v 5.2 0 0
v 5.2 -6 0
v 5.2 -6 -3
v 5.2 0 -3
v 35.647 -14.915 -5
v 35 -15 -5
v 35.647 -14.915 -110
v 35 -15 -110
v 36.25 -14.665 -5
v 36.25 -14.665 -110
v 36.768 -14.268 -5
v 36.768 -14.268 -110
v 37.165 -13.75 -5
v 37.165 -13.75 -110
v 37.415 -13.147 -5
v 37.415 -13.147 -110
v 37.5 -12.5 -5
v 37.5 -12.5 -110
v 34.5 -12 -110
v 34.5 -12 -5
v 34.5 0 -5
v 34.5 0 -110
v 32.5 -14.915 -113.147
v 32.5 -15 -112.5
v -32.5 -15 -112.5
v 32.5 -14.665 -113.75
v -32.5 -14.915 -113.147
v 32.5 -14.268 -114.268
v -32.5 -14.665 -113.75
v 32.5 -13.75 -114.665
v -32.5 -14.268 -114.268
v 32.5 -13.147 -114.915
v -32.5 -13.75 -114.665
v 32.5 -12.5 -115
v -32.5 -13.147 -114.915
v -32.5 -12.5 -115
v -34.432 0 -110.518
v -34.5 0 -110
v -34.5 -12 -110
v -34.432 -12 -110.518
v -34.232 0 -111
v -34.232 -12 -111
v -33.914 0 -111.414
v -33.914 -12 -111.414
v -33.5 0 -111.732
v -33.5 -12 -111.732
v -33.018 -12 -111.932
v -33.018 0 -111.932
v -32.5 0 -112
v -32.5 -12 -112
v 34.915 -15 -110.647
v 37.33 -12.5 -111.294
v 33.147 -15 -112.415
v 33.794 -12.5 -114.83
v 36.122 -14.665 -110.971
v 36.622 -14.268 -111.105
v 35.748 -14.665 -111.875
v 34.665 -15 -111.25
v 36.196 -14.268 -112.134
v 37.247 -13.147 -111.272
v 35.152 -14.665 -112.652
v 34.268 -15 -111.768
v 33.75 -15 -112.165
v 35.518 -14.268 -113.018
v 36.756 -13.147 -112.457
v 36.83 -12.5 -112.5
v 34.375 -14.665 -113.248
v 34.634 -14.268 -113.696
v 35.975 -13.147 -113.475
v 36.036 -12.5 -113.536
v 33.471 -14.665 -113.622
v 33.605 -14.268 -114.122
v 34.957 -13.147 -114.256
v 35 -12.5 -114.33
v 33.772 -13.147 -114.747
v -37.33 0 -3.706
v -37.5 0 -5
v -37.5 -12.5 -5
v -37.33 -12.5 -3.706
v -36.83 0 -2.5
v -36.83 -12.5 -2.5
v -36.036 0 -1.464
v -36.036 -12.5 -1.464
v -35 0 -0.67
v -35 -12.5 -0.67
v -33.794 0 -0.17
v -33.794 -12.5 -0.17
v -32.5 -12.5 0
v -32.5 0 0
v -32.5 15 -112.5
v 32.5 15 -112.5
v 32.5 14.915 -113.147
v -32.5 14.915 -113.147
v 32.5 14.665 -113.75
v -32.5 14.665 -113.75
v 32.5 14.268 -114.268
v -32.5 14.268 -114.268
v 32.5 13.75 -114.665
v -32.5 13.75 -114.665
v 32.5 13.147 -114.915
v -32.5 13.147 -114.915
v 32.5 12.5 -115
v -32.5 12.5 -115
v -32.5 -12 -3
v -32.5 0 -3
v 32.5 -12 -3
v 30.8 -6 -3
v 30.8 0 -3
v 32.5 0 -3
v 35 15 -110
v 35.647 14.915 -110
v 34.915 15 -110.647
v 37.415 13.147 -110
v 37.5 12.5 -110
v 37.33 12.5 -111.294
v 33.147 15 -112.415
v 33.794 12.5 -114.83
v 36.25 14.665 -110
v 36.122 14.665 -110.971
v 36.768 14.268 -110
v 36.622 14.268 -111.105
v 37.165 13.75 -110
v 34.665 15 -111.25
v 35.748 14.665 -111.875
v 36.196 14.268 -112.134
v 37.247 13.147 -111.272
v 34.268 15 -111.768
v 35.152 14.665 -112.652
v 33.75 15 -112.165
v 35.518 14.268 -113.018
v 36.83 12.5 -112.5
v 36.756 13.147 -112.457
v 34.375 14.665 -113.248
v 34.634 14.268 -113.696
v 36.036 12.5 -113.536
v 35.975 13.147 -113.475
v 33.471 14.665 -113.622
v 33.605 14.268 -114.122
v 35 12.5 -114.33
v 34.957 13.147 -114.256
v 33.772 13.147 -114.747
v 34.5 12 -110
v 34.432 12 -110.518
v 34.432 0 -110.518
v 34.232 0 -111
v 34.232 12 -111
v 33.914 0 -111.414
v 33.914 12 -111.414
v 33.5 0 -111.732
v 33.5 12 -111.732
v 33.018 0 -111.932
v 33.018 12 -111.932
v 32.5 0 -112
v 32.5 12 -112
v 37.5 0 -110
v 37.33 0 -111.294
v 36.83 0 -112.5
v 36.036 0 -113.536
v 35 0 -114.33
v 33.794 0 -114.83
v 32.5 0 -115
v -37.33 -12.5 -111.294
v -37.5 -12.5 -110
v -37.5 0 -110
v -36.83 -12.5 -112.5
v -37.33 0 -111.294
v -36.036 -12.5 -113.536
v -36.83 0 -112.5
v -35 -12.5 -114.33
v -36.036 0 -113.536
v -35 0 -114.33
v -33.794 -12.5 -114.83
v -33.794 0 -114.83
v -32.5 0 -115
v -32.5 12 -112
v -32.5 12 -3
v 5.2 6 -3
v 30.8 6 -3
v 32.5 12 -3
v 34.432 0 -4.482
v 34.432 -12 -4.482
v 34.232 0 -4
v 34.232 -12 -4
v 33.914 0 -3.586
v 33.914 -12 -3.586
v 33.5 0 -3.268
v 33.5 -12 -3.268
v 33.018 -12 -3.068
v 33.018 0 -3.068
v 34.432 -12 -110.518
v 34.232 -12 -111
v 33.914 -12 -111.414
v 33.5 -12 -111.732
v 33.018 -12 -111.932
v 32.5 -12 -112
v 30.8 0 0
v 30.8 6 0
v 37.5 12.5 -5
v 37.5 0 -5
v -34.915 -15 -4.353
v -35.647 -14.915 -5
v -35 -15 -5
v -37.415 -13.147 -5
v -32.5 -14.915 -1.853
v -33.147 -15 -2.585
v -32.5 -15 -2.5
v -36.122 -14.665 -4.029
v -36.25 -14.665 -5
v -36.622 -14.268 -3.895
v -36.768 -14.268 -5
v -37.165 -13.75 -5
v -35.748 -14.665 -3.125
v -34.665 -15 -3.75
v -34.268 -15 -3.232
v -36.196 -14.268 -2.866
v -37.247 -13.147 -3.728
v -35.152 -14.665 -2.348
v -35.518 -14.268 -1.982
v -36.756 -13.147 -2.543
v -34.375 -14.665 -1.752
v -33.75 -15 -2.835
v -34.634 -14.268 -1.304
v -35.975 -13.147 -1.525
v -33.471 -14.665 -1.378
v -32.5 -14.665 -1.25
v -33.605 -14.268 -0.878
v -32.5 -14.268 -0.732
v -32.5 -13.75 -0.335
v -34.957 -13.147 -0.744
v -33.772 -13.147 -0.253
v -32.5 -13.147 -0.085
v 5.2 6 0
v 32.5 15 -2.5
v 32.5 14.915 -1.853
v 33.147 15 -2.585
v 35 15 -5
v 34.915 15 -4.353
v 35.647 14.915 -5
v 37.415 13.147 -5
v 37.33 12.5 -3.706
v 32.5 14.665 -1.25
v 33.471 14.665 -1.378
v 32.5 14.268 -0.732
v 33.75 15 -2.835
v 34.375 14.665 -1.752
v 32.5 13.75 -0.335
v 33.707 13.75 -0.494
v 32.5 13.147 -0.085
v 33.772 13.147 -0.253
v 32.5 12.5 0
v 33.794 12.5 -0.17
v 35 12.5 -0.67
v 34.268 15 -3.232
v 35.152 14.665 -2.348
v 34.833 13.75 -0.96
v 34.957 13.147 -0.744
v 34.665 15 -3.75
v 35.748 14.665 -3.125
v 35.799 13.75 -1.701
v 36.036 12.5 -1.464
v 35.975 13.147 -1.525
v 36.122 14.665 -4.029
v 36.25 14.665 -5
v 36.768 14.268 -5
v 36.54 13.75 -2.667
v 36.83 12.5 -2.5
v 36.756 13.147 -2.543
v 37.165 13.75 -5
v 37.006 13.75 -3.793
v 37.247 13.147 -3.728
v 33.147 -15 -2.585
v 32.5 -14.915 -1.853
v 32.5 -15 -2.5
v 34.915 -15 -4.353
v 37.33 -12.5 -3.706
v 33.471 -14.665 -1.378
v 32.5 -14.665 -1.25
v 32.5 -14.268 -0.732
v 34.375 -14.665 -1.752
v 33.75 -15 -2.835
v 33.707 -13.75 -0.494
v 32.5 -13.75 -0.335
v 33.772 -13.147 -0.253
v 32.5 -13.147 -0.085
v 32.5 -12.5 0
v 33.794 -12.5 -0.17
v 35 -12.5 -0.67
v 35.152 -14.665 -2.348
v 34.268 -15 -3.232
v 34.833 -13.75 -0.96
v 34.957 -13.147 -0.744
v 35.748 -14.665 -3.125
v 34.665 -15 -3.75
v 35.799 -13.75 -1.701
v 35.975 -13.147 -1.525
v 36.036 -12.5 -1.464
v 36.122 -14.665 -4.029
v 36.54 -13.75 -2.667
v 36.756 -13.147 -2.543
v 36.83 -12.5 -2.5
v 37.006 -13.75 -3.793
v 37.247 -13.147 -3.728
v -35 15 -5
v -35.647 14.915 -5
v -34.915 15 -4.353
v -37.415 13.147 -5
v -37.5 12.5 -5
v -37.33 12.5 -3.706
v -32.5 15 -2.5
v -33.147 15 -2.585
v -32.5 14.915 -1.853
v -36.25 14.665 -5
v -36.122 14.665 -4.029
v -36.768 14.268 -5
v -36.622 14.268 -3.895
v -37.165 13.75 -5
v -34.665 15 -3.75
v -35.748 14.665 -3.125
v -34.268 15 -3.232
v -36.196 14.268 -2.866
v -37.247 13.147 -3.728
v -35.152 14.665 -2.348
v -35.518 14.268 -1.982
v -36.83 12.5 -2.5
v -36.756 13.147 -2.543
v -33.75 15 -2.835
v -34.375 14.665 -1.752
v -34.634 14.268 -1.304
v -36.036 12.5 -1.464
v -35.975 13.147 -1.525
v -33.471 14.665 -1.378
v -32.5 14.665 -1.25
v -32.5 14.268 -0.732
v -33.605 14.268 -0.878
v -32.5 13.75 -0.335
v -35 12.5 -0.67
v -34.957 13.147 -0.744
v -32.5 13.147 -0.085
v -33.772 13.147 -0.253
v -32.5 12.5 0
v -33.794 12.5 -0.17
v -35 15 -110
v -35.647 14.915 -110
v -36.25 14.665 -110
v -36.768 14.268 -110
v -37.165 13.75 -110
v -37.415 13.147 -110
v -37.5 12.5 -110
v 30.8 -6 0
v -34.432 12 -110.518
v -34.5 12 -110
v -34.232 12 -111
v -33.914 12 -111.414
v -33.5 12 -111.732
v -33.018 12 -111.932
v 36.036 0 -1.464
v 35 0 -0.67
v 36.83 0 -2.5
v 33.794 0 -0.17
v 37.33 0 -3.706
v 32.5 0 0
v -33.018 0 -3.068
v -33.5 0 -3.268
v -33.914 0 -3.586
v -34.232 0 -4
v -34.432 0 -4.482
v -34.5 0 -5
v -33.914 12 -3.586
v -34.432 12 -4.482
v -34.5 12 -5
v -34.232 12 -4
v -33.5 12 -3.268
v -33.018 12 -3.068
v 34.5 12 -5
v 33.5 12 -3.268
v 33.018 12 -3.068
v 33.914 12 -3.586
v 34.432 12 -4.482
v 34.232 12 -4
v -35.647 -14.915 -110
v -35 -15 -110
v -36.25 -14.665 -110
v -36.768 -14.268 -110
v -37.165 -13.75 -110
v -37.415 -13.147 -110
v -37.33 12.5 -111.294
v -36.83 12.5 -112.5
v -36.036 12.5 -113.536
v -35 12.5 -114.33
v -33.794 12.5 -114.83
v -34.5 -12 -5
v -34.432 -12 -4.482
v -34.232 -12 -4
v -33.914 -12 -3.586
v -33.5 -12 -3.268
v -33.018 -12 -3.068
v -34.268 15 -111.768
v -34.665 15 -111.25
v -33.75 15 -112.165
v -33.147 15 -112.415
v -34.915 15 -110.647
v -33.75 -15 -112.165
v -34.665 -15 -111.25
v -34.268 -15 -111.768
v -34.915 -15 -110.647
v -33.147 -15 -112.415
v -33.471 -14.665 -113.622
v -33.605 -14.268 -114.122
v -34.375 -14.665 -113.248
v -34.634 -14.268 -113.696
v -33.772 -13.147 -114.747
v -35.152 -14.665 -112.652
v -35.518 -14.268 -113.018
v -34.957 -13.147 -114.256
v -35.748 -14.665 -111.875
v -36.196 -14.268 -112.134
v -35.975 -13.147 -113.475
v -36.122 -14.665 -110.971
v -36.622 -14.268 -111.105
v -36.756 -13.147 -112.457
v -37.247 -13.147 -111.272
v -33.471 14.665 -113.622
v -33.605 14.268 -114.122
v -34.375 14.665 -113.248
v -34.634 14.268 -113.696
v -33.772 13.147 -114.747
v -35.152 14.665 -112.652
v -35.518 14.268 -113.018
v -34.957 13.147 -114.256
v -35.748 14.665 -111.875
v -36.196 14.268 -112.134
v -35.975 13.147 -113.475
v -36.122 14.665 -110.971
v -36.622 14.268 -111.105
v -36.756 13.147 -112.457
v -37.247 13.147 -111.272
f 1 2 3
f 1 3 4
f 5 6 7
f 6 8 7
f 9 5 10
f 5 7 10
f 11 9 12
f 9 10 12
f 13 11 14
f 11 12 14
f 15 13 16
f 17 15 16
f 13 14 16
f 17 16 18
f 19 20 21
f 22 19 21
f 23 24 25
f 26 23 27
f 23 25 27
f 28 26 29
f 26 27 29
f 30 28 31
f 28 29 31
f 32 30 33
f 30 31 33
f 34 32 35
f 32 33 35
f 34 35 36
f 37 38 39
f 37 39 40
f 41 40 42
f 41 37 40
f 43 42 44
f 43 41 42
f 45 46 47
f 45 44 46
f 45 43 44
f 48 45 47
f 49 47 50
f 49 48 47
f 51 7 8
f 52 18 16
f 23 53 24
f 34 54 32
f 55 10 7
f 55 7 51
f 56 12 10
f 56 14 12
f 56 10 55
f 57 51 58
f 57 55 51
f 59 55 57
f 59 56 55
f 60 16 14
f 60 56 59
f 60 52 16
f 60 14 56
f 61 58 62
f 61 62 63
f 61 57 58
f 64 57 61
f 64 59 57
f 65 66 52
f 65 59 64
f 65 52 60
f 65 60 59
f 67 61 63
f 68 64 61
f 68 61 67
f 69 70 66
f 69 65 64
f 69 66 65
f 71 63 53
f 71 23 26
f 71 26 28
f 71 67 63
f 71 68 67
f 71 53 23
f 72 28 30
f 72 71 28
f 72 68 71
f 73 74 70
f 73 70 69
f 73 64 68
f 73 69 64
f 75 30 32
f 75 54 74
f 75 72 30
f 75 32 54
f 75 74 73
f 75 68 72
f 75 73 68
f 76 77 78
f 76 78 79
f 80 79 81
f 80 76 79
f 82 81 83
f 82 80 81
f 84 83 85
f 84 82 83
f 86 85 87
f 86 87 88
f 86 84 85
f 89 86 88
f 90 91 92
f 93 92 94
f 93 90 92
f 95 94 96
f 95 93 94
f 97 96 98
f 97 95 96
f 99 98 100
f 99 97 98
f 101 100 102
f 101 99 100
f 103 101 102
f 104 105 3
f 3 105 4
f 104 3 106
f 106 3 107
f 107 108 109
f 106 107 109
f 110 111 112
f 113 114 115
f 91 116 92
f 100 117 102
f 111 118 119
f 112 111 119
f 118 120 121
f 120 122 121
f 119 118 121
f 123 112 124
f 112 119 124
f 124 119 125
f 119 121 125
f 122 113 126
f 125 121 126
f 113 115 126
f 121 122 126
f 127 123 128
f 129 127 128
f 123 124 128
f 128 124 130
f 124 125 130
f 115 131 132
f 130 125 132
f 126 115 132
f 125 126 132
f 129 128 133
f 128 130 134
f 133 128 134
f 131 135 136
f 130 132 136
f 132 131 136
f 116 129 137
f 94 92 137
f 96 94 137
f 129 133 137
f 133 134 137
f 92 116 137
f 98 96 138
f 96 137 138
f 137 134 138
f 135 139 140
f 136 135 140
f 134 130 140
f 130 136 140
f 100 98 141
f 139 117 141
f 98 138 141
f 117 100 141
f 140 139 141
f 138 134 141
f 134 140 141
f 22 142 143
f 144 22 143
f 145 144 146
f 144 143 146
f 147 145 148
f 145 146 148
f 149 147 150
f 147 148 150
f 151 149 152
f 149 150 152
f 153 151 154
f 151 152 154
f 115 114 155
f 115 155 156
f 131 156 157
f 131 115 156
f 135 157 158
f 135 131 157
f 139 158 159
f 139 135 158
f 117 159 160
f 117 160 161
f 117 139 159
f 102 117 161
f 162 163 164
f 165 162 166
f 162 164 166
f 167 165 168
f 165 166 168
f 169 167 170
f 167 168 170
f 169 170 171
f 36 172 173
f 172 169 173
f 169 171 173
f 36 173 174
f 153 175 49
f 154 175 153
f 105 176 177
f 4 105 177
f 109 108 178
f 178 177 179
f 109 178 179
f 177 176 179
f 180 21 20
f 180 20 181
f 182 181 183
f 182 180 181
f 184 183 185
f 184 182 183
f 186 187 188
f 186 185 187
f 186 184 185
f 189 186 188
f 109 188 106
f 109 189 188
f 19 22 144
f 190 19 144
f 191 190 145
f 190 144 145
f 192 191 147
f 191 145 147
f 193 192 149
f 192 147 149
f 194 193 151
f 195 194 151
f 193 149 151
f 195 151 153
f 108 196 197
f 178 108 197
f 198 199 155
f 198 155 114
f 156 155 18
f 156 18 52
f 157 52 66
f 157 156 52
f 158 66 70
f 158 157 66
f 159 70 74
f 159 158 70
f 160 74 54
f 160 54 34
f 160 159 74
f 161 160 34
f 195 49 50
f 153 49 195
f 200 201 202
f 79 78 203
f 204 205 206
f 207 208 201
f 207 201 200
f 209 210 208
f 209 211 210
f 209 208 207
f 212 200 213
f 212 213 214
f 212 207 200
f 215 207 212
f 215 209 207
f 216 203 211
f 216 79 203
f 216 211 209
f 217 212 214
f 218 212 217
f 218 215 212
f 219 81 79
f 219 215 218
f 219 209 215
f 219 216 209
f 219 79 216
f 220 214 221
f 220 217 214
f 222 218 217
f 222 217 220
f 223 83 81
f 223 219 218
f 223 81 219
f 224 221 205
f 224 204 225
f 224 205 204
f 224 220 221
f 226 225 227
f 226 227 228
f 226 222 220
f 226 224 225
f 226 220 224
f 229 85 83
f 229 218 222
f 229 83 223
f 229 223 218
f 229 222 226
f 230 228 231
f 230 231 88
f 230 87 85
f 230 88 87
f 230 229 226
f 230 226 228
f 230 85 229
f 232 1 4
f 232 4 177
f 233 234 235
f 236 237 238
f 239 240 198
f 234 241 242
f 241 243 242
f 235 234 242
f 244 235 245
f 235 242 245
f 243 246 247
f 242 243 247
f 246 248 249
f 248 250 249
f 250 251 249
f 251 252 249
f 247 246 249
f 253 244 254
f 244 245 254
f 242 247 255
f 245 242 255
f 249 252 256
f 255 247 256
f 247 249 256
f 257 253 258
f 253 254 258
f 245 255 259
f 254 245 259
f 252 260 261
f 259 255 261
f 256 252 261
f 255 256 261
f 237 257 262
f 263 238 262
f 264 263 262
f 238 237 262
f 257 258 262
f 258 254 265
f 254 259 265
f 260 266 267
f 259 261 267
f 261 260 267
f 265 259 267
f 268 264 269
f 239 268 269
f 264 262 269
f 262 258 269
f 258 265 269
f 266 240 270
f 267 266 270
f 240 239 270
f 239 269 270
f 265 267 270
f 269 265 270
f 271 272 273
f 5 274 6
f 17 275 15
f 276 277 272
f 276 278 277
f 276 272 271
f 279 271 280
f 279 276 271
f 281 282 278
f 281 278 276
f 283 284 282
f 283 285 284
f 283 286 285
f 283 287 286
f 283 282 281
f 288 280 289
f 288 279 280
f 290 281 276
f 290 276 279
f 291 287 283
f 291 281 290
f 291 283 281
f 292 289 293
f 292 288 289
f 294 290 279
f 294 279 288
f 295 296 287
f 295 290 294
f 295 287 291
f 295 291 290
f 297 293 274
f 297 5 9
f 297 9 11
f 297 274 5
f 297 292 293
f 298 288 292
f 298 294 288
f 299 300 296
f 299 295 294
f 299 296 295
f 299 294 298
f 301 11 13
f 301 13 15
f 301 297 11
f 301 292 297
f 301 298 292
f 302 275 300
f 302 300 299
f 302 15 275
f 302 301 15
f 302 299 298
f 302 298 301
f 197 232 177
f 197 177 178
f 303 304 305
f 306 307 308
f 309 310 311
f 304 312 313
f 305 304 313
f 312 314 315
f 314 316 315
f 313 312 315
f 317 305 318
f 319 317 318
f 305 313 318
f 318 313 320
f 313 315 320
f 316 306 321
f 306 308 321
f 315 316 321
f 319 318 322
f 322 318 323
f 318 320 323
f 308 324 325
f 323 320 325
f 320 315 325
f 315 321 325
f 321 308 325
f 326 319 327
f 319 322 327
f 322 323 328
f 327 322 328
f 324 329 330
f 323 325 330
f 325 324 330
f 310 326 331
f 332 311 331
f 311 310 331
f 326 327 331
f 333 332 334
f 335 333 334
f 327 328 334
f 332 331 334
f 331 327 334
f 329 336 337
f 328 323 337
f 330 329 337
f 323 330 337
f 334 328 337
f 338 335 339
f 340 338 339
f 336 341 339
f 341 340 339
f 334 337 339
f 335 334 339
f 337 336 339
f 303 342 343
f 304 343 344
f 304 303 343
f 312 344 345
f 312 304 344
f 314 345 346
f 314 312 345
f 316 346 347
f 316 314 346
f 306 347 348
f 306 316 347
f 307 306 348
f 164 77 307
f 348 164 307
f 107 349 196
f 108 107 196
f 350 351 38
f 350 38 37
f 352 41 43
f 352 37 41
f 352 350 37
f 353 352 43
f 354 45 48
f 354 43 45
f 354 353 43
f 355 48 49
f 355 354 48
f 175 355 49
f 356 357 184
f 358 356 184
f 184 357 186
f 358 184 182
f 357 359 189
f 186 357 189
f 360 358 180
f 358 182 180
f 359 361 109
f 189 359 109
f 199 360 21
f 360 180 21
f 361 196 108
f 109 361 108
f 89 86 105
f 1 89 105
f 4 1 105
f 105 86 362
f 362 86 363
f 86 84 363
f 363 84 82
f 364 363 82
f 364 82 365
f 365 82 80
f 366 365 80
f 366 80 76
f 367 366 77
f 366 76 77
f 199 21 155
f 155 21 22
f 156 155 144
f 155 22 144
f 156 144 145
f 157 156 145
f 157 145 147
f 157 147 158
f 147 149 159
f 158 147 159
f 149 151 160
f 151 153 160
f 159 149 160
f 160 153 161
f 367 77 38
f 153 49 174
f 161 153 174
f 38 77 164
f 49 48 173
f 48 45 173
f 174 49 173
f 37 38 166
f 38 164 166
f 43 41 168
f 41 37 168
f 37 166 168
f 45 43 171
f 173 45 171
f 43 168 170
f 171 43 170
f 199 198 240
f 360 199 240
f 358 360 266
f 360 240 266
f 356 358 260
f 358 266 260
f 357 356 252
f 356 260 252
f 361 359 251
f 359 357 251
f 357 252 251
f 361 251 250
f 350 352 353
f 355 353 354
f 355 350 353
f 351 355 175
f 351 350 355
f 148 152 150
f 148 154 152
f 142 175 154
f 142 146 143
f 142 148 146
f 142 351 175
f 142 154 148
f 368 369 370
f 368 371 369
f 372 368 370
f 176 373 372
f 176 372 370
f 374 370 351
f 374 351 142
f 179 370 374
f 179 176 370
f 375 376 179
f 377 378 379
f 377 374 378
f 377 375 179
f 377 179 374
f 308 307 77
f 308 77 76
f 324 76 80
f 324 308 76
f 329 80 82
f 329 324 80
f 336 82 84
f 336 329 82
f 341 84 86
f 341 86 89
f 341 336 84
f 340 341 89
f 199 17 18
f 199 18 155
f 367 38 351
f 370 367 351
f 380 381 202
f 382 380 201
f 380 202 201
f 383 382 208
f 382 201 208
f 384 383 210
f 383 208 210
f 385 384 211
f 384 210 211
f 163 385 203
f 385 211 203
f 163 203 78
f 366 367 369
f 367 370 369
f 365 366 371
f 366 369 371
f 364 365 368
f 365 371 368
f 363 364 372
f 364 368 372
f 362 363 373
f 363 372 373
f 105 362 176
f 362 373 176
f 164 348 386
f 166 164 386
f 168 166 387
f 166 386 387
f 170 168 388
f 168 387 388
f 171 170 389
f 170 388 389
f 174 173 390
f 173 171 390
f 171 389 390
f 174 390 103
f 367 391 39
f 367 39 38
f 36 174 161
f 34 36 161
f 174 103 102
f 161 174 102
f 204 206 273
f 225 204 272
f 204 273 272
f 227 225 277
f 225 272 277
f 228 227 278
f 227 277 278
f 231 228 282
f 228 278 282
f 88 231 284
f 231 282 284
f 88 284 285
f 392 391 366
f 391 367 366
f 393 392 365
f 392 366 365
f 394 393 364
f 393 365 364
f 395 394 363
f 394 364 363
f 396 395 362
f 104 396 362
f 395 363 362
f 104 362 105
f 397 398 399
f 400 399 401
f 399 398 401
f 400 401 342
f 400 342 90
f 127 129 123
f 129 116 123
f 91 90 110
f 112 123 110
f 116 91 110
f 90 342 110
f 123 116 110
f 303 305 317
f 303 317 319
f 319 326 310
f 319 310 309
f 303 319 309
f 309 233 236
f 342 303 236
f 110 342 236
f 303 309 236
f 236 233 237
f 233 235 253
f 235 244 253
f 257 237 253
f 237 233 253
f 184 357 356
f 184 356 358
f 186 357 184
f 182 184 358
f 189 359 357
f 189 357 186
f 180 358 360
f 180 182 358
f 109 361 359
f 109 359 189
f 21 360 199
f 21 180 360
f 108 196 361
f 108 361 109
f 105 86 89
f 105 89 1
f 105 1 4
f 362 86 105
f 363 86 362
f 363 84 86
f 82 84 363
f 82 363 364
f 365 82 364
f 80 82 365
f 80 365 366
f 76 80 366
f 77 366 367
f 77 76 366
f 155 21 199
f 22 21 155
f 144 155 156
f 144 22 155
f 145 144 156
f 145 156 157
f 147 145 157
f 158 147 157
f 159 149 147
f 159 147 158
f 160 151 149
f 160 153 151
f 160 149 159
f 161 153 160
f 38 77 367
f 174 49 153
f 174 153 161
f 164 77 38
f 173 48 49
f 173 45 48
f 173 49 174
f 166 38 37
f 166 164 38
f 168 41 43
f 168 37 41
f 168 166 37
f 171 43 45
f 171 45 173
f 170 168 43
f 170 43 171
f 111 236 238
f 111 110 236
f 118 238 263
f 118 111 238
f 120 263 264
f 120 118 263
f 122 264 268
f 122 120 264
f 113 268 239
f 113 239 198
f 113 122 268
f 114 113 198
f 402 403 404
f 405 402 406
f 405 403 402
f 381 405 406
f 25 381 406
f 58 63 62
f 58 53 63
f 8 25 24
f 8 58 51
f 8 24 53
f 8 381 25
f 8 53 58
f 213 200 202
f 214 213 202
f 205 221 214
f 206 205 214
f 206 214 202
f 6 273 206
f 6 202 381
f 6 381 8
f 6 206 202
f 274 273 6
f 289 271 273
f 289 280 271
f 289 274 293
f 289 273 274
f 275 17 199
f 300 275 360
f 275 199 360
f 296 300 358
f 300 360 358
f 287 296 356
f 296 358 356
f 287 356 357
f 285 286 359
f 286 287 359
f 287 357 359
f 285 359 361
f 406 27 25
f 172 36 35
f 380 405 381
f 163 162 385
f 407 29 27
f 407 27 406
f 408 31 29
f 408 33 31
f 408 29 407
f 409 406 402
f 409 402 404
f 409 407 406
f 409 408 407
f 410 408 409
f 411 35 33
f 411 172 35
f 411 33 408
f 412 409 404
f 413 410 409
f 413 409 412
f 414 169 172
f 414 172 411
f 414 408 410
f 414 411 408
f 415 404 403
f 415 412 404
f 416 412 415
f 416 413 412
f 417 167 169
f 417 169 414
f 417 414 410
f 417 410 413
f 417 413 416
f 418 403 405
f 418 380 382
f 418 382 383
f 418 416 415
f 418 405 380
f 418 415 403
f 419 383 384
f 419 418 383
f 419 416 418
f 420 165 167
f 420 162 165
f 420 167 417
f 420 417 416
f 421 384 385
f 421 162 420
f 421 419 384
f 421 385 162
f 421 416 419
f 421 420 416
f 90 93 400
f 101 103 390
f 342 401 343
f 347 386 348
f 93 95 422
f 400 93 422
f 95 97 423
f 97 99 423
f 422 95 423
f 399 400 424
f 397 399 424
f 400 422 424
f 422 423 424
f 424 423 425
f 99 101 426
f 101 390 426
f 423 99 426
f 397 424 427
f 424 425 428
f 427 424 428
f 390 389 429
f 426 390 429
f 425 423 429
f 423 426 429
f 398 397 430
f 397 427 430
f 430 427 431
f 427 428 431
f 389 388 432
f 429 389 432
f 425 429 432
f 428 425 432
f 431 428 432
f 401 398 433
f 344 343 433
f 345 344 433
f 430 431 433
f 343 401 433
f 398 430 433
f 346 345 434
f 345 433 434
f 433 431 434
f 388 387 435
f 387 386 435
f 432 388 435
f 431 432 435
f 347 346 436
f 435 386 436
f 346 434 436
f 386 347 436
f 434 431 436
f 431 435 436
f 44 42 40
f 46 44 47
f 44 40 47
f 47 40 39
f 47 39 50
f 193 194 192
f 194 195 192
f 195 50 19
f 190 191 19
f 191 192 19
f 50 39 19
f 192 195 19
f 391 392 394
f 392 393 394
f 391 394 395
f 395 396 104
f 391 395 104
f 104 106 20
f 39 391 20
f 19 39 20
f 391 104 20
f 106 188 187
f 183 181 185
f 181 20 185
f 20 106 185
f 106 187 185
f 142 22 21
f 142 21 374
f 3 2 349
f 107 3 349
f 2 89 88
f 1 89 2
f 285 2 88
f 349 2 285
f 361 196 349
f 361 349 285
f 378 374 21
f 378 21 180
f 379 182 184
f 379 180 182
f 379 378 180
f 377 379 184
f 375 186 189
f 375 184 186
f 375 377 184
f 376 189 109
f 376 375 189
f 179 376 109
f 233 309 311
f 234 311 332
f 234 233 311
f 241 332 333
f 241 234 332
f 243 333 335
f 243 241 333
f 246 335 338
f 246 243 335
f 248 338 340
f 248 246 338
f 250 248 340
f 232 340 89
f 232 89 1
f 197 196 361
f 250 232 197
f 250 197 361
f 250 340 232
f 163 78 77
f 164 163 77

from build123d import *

# Parameters (mm, degrees)
SKETCH1_W              = 75
SKETCH1_H              = 30
BOSS_EXTRUDE1_DEPTH    = 115
FILLET1_R              = 5
FILLET2_R              = 2.5
SHELL1_T               = 3
SKETCH3_W              = 25.6
SKETCH3_H              = 12
CUT_EXTRUDE1_DEPTH     = 3
SPLIT1_SURFACE_1_BACK  = 141.535
SPLIT1_SURFACE_1_DEPTH = 283.07
SPLIT1_SURFACE_2_BACK  = 141.535
SPLIT1_SURFACE_2_DEPTH = 283.07


with BuildPart() as part:
    # Sketch1 → Boss-Extrude1 (new body)
    with BuildSketch(Plane.XY):
        Rectangle(SKETCH1_W, SKETCH1_H)
    extrude(amount=-BOSS_EXTRUDE1_DEPTH)

    # Fillet1
    fillet1_edges = [part.edges().sort_by_distance(p)[0] for p in [
        (37.5, 0, -115),
        (-37.5, 0, -115),
        (37.5, 0, 0),
        (-37.5, 0, 0),
    ]]
    fillet(fillet1_edges, radius=FILLET1_R)

    # Fillet2
    fillet2_edges = [part.edges().sort_by_distance(p)[0] for p in [
        (37.5, -15, -57.5),
        (37.5, 15, -57.5),
        (0, 15, 0),
        (0, 15, -115),
        (-37.5, 15, -57.5),
        (-36.035533906, 15, -113.535533906),
        (-36.035533906, 15, -1.464466094),
        (36.035533906, 15, -1.464466094),
        (36.035533906, 15, -113.535533906),
        (0, -15, -115),
        (0, -15, 0),
        (-37.5, -15, -57.5),
        (-36.035533906, -15, -113.535533906),
        (-36.035533906, -15, -1.464466094),
        (36.035533906, -15, -1.464466094),
        (36.035533906, -15, -113.535533906),
    ]]
    fillet(fillet2_edges, radius=FILLET2_R)

    # Shell1 (no face opened: a closed hollow body)
    add(offset(amount=-SHELL1_T, mode=Mode.PRIVATE), mode=Mode.SUBTRACT)

    # Sketch3 → Cut-Extrude1 (cut)
    with BuildSketch(Plane.XY):
        with Locations((18, 0)):
            Rectangle(SKETCH3_W, SKETCH3_H)
    extrude(amount=-CUT_EXTRUDE1_DEPTH, mode=Mode.SUBTRACT)


with BuildPart() as body_2:
    # Split1: the piece behind the surface
    add(part.part)
    # Split1 surface: a surface, the sketch's curves swept straight by 283.07 mm
    with BuildLine(Plane(origin=(0, 0, 0), x_dir=(0, 0, -1), z_dir=(1, 0, 0)).offset(-SPLIT1_SURFACE_1_BACK), mode=Mode.PRIVATE) as split1_surface_1_path:
        Line((-7.5, 0), (122.5, 0))
    split1_surface_1 = Shell.extrude(split1_surface_1_path.wire(), (1 * SPLIT1_SURFACE_1_DEPTH, 0 * SPLIT1_SURFACE_1_DEPTH, 0 * SPLIT1_SURFACE_1_DEPTH))
    split(bisect_by=split1_surface_1, keep=Keep.BOTTOM)


with BuildPart() as part_1:
    add(part.part)

    # Split1: split by a surface, the side it looks to stays
    # Split1 surface: a surface, the sketch's curves swept straight by 283.07 mm
    with BuildLine(Plane(origin=(0, 0, 0), x_dir=(0, 0, -1), z_dir=(1, 0, 0)).offset(-SPLIT1_SURFACE_2_BACK), mode=Mode.PRIVATE) as split1_surface_2_path:
        Line((-7.5, 0), (122.5, 0))
    split1_surface_2 = Shell.extrude(split1_surface_2_path.wire(), (1 * SPLIT1_SURFACE_2_DEPTH, 0 * SPLIT1_SURFACE_2_DEPTH, 0 * SPLIT1_SURFACE_2_DEPTH))
    split(bisect_by=split1_surface_2, keep=Keep.TOP)


solid = Compound([body_2.part, part_1.part])
